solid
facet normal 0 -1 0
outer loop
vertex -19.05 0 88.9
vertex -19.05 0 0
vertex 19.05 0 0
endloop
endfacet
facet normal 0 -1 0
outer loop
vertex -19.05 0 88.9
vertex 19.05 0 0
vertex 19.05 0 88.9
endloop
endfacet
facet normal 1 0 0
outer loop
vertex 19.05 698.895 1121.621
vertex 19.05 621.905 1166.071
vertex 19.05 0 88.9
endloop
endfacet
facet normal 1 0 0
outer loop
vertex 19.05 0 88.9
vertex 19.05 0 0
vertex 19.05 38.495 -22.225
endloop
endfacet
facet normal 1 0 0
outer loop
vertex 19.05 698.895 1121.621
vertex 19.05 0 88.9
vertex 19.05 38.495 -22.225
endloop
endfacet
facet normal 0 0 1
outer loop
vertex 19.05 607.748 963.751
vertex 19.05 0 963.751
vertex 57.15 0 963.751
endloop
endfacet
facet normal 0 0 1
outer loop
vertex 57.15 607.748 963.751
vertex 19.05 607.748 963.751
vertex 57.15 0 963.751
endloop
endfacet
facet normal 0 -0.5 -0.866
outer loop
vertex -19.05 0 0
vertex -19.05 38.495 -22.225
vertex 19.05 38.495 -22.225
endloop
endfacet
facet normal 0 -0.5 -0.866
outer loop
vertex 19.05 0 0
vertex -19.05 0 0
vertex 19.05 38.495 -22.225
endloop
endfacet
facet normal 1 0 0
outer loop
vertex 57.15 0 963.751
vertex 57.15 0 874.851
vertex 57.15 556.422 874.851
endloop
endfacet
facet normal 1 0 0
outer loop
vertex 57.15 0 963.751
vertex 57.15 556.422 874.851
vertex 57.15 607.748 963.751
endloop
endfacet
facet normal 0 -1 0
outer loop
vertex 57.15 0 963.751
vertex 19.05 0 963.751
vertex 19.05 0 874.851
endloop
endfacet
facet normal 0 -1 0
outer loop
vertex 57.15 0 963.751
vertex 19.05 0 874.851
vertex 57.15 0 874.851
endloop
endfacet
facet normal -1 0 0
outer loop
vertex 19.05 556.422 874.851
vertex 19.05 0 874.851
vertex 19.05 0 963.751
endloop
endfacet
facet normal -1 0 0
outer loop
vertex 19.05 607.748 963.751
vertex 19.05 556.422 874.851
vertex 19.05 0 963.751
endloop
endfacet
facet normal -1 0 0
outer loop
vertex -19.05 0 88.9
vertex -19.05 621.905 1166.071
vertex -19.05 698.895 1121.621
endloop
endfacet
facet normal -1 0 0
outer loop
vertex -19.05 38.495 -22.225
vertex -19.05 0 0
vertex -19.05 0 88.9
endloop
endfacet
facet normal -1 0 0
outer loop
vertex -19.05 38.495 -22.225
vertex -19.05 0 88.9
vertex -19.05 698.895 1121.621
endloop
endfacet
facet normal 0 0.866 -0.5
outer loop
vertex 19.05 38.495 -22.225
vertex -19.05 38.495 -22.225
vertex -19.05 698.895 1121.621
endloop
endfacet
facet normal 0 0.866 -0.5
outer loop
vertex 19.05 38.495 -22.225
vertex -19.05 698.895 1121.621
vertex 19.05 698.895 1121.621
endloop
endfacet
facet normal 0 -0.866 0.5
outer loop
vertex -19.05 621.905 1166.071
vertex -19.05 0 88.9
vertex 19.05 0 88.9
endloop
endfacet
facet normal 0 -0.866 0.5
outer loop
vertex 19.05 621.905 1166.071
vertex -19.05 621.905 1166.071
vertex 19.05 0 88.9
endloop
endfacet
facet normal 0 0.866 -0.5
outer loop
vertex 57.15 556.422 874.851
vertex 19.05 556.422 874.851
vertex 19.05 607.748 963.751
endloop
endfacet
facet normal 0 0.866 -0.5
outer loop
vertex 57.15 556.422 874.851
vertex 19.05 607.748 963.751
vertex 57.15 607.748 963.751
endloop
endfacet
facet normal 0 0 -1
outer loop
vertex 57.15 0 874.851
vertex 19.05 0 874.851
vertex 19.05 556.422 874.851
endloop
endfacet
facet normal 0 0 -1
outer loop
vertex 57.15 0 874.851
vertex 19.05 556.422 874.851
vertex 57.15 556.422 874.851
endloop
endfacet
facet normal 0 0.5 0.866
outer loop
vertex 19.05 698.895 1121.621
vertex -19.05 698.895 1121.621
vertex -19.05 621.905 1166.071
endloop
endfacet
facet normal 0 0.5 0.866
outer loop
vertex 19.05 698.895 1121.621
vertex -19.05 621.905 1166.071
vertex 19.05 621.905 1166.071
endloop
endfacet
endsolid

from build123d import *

# Parameters (mm, degrees)
SKETCH_2X4_W            = 38.1
SKETCH_2X4_H            = 88.9
PROFILES_2X4_1_DEPTH    = 1320.8
SKETCH_2X41_W           = 38.1
SKETCH_2X41_H           = 88.9
PROFILES_2X4_2_DEPTH    = 530.758809707
BODY_2_RUN_ON_DEPTH     = 595.55442
CUT_EXTRUDE1_DEPTH      = 1361.010291619
CUT_EXTRUDE1_DEPTH_BACK = 1361.010291619


with BuildPart() as part:
    # 2x4 → Profiles 2X4(1) (new body)
    with BuildSketch(Plane(origin=(0, 0, 0), x_dir=(1, 0, 0), z_dir=(0, 0.5000000000000009, 0.8660254037844382))):
        Rectangle(SKETCH_2X4_W, SKETCH_2X4_H)
    extrude(amount=PROFILES_2X4_1_DEPTH)

    # Sketch5 → Cut-Extrude1 (cut, two sides: drawn at the far end of the back side and taken through both)
    with BuildSketch(Plane(origin=(19.05, 0, 0), x_dir=(0, 0, -1), z_dir=(1, 0, 0)).offset(-CUT_EXTRUDE1_DEPTH_BACK)):
        Polygon((-3831.136128898, 0), (-764.986915909, 0), (192.809811734, 0), (3258.959024723, 0), (3258.959024723, -6132.298425979), (-3831.136128898, -6132.298425979), align=None)
    extrude(amount=CUT_EXTRUDE1_DEPTH + CUT_EXTRUDE1_DEPTH_BACK, mode=Mode.SUBTRACT)


with BuildPart() as body_2:
    # 2x41 → Profiles 2X4(2) (new body)
    with BuildSketch(Plane(origin=(38.1, 530.758809707, 919.301224977), x_dir=(1, 0, 0), z_dir=(0, -1, 0))):
        Rectangle(SKETCH_2X41_W, SKETCH_2X41_H)
    extrude(amount=PROFILES_2X4_2_DEPTH)

    # 2x41 → body 2 run on (add)
    with BuildSketch(Plane(origin=(38.1, 530.758809707, 919.301224977), x_dir=(1, 0, 0), z_dir=(0, -1, 0))):
        Rectangle(SKETCH_2X41_W, SKETCH_2X41_H)
    extrude(amount=-BODY_2_RUN_ON_DEPTH)

    # Trim_Extend1 6
    split(bisect_by=Plane(origin=(0, 368.694829198, 549.698176659), x_dir=(1, 0, 0), z_dir=(0, -0.866025404, 0.5)), keep=Keep.TOP)


solid = Compound([part.part, body_2.part])
